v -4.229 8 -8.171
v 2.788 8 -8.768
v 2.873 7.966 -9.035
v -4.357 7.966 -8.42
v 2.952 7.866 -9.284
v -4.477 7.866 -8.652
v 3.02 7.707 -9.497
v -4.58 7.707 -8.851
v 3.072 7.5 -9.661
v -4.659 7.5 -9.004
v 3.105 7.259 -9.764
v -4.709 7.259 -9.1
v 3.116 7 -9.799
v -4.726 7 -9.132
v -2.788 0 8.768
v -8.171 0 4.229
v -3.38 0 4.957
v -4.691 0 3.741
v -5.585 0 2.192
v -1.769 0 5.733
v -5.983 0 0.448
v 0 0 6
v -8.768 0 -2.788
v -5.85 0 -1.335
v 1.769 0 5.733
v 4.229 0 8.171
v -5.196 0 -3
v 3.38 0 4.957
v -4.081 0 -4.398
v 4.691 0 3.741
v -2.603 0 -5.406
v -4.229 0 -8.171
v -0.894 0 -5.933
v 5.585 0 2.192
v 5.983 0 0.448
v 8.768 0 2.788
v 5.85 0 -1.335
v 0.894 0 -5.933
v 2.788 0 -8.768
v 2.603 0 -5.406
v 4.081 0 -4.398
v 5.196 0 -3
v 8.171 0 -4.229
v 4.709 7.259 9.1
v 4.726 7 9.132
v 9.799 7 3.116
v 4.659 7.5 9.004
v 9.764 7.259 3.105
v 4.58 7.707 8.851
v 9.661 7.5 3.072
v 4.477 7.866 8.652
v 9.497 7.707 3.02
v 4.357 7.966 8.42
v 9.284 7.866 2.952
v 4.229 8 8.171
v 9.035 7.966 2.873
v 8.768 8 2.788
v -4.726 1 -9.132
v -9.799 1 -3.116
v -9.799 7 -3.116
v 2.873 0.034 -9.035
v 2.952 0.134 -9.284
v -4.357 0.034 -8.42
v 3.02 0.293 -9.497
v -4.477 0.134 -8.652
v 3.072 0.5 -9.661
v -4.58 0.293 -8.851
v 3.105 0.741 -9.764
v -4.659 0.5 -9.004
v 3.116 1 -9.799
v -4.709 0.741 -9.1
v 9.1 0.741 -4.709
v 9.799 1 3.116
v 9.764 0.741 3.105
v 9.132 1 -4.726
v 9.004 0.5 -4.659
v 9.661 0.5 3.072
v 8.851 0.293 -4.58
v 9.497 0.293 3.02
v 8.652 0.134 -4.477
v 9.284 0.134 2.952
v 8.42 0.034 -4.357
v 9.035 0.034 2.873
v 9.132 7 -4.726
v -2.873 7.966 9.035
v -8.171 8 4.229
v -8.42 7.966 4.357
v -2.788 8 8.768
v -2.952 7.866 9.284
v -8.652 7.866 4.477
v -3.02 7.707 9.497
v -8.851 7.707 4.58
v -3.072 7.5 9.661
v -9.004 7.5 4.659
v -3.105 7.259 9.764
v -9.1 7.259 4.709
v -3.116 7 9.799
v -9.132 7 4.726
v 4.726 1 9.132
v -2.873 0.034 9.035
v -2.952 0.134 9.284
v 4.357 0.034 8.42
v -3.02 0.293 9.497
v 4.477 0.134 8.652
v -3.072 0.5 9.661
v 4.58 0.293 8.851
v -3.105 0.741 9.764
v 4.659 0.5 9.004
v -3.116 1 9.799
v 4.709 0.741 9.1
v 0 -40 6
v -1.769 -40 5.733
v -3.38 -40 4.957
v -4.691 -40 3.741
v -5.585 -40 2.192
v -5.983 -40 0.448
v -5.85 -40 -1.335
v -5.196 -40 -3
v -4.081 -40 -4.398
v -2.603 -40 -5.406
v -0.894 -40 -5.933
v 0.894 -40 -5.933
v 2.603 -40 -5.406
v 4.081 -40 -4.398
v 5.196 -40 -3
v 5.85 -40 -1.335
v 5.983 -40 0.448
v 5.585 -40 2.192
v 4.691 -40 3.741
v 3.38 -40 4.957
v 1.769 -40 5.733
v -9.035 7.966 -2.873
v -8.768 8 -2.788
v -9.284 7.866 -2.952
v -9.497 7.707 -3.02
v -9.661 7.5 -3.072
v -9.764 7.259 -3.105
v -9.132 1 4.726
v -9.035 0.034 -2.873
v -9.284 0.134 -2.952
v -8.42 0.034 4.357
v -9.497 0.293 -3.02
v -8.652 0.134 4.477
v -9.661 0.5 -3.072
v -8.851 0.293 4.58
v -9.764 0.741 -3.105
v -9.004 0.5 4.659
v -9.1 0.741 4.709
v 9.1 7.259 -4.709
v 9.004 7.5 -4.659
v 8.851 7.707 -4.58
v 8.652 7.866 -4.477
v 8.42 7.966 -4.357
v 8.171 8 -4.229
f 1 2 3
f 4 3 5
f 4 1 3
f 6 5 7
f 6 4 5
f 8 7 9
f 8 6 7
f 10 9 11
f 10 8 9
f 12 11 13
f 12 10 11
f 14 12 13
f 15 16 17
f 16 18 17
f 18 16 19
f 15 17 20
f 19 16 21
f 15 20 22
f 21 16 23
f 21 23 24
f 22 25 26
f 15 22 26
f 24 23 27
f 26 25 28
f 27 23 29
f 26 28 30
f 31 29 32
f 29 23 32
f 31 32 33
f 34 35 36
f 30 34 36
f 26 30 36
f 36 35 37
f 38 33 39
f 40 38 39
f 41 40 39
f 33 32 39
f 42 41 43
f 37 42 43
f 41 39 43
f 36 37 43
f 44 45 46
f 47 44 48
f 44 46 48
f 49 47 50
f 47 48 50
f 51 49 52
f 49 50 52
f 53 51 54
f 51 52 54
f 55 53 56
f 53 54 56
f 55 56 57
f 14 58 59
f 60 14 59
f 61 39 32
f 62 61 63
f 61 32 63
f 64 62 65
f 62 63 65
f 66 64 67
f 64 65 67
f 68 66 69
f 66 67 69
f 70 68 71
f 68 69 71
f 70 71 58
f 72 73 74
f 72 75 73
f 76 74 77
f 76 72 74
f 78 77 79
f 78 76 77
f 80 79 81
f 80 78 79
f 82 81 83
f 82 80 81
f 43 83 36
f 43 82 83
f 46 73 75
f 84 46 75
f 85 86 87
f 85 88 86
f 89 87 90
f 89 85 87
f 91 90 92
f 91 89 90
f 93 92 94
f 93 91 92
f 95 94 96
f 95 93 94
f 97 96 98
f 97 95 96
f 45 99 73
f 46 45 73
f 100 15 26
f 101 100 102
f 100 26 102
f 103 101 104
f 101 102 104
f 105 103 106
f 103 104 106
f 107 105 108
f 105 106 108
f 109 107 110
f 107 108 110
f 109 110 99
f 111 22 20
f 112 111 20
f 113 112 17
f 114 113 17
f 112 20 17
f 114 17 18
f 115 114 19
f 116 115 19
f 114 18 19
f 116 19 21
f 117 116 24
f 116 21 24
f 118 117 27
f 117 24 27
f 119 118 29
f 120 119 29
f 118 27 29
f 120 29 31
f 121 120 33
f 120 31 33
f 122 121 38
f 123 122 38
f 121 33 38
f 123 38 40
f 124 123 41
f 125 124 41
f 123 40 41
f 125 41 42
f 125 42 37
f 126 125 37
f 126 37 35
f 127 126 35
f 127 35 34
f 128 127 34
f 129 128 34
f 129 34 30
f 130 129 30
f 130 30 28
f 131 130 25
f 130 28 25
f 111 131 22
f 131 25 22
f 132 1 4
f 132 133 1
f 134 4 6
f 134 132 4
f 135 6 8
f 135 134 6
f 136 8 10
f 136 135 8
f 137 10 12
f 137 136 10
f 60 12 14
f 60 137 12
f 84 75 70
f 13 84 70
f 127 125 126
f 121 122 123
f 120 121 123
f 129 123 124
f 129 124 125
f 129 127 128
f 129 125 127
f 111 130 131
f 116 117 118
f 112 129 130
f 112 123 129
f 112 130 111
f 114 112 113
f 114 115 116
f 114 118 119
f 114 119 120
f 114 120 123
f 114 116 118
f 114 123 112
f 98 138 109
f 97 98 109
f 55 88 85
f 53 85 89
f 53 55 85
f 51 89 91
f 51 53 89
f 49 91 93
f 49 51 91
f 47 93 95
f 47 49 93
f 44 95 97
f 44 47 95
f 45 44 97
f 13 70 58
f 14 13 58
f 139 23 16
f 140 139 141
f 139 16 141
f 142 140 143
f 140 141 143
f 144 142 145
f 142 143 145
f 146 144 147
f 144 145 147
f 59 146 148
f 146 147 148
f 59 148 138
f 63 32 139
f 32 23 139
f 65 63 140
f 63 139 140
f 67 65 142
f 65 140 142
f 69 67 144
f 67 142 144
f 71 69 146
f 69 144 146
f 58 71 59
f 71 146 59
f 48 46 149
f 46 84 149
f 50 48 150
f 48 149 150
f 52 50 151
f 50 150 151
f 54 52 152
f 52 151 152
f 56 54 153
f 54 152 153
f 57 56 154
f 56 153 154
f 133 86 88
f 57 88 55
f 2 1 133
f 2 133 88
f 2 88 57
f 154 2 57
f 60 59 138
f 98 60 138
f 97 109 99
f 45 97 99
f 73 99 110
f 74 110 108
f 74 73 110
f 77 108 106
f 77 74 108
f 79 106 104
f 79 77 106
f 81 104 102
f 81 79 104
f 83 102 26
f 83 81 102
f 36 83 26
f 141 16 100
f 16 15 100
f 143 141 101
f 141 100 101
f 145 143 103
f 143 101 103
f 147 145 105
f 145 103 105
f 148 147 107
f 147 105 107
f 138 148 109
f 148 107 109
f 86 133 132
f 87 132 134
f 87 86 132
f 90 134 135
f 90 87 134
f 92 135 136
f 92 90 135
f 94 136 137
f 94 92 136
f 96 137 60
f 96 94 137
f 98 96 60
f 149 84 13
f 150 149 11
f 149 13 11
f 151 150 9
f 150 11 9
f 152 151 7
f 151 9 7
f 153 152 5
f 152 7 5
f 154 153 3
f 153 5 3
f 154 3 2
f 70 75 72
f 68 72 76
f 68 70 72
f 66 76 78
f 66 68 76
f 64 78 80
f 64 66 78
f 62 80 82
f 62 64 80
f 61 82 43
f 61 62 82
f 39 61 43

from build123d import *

# Parameters (mm, degrees)
BOSS_EXTRUDE1_DEPTH = 8
SKETCH2_R           = 6
BOSS_EXTRUDE2_DEPTH = 40
FILLET1_R           = 1


with BuildPart() as part:
    # Sketch1 → Boss-Extrude1 (new body)
    with BuildSketch(Plane(origin=(0, 0, 0), x_dir=(1, 0, 0), z_dir=(0, 1, 0))):
        Polygon((9.799334365, -3.115685798), (9.132298337, 4.726053225), (3.115685798, 9.799334365), (-4.726053225, 9.132298337), (-9.799334365, 3.115685798), (-9.132298337, -4.726053225), (-3.115685798, -9.799334365), (4.726053225, -9.132298337), align=None)
    extrude(amount=BOSS_EXTRUDE1_DEPTH)

    # Sketch2 → Boss-Extrude2 (add)
    with BuildSketch(Plane.XZ):
        with Locations(Location((0, 0, 0), (0, 0, 90))):
            Circle(SKETCH2_R)
    extrude(amount=BOSS_EXTRUDE2_DEPTH)

    # Fillet1
    fillet1_edges = [part.edges().sort_by_distance(p)[0] for p in [
        (-9.465816351, 8, 0.805183713),
        (-7.262693795, 0, -6.123992067),
        (-0.805183713, 0, -9.465816351),
        (-6.123992067, 8, 7.262693795),
        (0.805183713, 8, 9.465816351),
        (7.262693795, 8, 6.123992067),
        (9.465816351, 8, -0.805183713),
        (6.123992067, 8, -7.262693795),
        (-0.805183713, 8, -9.465816351),
        (-7.262693795, 8, -6.123992067),
        (6.123992067, 0, -7.262693795),
        (9.465816351, 0, -0.805183713),
        (7.262693795, 0, 6.123992067),
        (0.805183713, 0, 9.465816351),
        (-6.123992067, 0, 7.262693795),
        (-9.465816351, 0, 0.805183713),
    ]]
    fillet(fillet1_edges, radius=FILLET1_R)


solid = part.part
